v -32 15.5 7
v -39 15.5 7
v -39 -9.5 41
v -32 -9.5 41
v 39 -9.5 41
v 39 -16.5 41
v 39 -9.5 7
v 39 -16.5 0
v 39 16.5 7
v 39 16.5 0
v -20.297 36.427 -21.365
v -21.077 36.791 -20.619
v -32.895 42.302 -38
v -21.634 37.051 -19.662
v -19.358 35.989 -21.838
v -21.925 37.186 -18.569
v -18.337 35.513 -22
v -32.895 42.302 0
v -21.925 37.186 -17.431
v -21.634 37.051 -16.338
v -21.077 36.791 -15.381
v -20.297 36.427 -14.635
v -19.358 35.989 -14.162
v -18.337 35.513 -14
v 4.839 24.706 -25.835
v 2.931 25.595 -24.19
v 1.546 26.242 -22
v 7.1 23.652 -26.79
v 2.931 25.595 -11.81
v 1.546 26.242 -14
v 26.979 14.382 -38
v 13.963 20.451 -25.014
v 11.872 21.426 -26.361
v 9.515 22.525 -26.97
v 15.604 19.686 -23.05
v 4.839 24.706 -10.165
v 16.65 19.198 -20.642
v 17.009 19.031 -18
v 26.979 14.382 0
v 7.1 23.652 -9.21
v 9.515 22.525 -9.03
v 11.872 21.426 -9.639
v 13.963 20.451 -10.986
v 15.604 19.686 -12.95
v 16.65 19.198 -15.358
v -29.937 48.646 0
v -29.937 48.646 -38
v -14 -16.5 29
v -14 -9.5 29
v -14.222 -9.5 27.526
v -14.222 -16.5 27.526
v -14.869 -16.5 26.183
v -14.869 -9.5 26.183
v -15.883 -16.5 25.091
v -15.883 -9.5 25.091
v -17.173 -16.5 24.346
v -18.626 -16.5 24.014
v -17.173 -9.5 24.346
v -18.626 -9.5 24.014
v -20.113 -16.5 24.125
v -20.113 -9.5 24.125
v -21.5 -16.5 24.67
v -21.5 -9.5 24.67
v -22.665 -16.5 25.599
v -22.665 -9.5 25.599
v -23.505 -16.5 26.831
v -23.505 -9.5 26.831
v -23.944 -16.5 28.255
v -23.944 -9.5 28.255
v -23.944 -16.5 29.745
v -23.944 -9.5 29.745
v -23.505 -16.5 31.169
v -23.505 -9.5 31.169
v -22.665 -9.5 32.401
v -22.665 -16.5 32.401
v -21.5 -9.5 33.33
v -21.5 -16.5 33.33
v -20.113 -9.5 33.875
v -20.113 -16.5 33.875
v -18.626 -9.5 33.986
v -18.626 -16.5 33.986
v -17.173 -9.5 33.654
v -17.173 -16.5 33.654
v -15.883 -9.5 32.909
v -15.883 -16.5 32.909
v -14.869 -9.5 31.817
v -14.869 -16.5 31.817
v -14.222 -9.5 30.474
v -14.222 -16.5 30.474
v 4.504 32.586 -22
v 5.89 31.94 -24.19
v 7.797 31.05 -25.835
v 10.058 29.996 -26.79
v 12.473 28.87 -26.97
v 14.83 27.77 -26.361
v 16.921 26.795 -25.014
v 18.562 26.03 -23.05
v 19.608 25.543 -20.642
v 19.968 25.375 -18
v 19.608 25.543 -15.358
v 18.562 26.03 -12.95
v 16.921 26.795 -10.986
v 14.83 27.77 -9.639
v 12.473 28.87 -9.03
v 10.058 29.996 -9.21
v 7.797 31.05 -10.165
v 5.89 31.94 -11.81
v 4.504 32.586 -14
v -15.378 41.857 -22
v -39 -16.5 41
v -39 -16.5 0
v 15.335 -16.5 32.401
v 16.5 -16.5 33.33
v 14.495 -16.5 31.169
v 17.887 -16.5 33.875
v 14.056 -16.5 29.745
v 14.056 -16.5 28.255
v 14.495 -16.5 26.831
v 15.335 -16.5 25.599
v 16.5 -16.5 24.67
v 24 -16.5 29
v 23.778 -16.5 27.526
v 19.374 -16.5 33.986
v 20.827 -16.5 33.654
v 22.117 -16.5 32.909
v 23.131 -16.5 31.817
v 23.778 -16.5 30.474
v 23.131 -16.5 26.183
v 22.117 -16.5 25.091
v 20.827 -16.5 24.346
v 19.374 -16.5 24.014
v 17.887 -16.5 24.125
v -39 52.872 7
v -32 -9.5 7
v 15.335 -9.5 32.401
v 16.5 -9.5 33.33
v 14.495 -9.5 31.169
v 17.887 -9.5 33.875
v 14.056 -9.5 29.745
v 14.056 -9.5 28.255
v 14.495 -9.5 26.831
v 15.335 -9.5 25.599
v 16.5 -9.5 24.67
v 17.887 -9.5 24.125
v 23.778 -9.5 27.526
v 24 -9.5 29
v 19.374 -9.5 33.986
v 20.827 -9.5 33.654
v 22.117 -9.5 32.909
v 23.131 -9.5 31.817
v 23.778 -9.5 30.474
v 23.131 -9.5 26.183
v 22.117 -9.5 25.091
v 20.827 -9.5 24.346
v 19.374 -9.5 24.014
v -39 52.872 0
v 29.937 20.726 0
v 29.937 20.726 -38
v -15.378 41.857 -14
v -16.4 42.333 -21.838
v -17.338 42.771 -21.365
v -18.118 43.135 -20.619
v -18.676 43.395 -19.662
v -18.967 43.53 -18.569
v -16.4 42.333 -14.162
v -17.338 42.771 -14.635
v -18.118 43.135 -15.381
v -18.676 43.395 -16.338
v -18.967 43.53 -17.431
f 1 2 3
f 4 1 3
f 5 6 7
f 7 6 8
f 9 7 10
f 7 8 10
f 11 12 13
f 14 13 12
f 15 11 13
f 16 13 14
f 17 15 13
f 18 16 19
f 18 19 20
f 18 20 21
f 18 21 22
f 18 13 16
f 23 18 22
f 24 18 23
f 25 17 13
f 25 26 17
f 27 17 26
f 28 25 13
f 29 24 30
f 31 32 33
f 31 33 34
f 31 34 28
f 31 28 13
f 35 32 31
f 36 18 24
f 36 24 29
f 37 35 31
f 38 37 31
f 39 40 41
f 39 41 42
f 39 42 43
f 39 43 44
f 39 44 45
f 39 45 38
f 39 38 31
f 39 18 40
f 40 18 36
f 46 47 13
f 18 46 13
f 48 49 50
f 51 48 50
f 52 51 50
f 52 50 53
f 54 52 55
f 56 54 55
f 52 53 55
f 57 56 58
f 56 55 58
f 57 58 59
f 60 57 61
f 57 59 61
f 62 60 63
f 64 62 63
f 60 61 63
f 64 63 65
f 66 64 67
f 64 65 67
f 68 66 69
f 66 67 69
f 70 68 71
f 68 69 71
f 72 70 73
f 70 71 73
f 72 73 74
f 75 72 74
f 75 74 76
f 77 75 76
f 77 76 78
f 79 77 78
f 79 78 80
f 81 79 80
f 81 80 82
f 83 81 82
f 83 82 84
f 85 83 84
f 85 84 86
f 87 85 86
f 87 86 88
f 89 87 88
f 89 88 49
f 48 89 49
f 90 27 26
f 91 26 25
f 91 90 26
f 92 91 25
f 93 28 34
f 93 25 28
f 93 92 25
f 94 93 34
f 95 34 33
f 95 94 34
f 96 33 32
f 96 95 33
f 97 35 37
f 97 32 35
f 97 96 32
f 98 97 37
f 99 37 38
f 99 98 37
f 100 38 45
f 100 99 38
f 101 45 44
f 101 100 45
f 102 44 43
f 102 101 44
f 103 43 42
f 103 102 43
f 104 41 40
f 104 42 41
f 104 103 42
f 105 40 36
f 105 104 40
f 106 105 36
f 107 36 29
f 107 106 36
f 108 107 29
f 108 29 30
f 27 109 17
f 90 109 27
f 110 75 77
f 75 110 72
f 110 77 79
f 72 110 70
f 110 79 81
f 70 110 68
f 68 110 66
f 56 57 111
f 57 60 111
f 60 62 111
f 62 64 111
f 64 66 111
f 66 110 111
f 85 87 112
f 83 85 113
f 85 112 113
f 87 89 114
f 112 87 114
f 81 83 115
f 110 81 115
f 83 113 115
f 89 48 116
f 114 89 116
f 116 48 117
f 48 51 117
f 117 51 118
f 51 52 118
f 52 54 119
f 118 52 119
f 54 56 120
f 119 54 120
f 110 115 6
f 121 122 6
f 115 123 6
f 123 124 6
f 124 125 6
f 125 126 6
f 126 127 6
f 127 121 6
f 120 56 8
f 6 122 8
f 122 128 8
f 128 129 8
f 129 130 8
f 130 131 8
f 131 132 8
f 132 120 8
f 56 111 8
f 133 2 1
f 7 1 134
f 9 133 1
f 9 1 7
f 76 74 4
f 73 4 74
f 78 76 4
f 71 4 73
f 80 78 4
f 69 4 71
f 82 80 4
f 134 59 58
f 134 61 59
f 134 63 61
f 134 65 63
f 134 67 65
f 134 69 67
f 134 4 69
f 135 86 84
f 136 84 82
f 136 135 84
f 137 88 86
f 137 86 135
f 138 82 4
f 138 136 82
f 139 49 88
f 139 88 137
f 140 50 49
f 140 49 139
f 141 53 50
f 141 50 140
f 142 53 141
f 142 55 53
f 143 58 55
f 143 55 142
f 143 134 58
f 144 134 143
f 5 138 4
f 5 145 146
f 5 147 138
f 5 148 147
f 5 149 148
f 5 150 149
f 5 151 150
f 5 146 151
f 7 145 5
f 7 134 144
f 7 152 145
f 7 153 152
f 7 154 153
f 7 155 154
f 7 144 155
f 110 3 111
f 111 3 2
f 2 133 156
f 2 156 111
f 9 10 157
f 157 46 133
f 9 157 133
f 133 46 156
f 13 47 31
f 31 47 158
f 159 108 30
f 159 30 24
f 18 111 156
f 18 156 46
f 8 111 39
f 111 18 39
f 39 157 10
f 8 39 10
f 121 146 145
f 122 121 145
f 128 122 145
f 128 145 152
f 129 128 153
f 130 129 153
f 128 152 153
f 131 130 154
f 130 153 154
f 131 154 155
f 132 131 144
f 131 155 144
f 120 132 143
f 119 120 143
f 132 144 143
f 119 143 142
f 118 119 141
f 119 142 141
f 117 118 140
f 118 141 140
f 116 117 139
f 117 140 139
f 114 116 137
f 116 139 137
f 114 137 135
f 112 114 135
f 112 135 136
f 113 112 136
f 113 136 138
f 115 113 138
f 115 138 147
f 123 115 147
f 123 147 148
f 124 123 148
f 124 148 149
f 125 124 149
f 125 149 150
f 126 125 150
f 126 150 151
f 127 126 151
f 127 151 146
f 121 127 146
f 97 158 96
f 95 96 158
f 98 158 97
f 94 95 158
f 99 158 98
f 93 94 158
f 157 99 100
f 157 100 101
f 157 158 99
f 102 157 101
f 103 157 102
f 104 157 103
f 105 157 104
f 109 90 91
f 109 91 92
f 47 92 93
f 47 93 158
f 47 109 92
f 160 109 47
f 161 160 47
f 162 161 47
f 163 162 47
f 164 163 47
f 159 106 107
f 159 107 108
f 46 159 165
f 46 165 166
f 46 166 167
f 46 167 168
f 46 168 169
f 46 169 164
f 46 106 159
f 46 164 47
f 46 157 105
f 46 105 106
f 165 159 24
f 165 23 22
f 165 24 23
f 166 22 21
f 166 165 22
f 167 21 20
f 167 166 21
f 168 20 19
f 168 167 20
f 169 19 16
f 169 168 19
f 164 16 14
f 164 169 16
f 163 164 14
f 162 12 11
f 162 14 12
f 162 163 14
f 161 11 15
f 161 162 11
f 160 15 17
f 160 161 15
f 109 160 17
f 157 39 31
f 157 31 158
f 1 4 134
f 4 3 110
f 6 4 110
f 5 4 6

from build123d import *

# Parameters (mm, degrees)
BOSS_EXTRUDE1_DEPTH = 7
BOSS_EXTRUDE2_DEPTH = 38
CUT_EXTRUDE1_DEPTH  = 48
SKETCH4_W           = 78
SKETCH4_H           = 7
BOSS_EXTRUDE3_DEPTH = 34
BOSS_EXTRUDE4_DEPTH = 7
SKETCH6_R           = 5
CUT_EXTRUDE2_DEPTH  = 21


with BuildPart() as part:
    # Sketch1 → Boss-Extrude1 (new body)
    with BuildSketch(Plane.XY):
        Polygon((39, 16.5), (-39, 52.871997336), (-39, 16.5), (-39, -16.5), (39, -16.5), align=None)
    extrude(amount=BOSS_EXTRUDE1_DEPTH)

    # Sketch2 → Boss-Extrude2 (add)
    with BuildSketch(Plane(origin=(0, 0, 0), x_dir=(-1, 0, 0), z_dir=(0, 0, -1))):
        Polygon((-29.93692213, 20.726182617), (29.93692213, 48.645814719), (32.895249962, 42.301660209), (-26.978594297, 14.382028108), align=None)
    extrude(amount=BOSS_EXTRUDE2_DEPTH)

    # Sketch3 → Cut-Extrude1 (cut)
    with BuildSketch(Plane(origin=(13.285508267, 28.490864421, 0), x_dir=(0.906307787, -0.422618262, 0), z_dir=(0.422618262, 0.906307787, 0))):
        with BuildLine():
            Line((-31.627197624, 22), (-9.689455373, 22))
            ThreePointArc((-9.689455373, 22), (7.372802376, 18), (-9.689455373, 14))
            Line((-9.689455373, 14), (-31.627197624, 14))
            ThreePointArc((-31.627197624, 14), (-35.627197624, 18), (-31.627197624, 22))
        make_face()
    extrude(amount=-CUT_EXTRUDE1_DEPTH, mode=Mode.SUBTRACT)

    # Sketch4 → Boss-Extrude3 (add)
    with BuildSketch(Plane.XY.offset(7)):
        with Locations((0, -13)):
            Rectangle(SKETCH4_W, SKETCH4_H)
    extrude(amount=BOSS_EXTRUDE3_DEPTH)

    # Sketch5 → Boss-Extrude4 (add)
    with BuildSketch(Plane.ZY.offset(39)):
        Polygon((7, -9.5), (7, 15.5), (41, -9.5), align=None)
    extrude(amount=-BOSS_EXTRUDE4_DEPTH)

    # Sketch6 → Cut-Extrude2 (cut)
    with BuildSketch(Plane(origin=(0, -9.5, 0), x_dir=(1, 0, 0), z_dir=(0, 1, 0))):
        with Locations((-19, -29)):
            Circle(SKETCH6_R)
        with Locations((19, -29)):
            Circle(SKETCH6_R)
    extrude(amount=-CUT_EXTRUDE2_DEPTH, mode=Mode.SUBTRACT)


solid = part.part
